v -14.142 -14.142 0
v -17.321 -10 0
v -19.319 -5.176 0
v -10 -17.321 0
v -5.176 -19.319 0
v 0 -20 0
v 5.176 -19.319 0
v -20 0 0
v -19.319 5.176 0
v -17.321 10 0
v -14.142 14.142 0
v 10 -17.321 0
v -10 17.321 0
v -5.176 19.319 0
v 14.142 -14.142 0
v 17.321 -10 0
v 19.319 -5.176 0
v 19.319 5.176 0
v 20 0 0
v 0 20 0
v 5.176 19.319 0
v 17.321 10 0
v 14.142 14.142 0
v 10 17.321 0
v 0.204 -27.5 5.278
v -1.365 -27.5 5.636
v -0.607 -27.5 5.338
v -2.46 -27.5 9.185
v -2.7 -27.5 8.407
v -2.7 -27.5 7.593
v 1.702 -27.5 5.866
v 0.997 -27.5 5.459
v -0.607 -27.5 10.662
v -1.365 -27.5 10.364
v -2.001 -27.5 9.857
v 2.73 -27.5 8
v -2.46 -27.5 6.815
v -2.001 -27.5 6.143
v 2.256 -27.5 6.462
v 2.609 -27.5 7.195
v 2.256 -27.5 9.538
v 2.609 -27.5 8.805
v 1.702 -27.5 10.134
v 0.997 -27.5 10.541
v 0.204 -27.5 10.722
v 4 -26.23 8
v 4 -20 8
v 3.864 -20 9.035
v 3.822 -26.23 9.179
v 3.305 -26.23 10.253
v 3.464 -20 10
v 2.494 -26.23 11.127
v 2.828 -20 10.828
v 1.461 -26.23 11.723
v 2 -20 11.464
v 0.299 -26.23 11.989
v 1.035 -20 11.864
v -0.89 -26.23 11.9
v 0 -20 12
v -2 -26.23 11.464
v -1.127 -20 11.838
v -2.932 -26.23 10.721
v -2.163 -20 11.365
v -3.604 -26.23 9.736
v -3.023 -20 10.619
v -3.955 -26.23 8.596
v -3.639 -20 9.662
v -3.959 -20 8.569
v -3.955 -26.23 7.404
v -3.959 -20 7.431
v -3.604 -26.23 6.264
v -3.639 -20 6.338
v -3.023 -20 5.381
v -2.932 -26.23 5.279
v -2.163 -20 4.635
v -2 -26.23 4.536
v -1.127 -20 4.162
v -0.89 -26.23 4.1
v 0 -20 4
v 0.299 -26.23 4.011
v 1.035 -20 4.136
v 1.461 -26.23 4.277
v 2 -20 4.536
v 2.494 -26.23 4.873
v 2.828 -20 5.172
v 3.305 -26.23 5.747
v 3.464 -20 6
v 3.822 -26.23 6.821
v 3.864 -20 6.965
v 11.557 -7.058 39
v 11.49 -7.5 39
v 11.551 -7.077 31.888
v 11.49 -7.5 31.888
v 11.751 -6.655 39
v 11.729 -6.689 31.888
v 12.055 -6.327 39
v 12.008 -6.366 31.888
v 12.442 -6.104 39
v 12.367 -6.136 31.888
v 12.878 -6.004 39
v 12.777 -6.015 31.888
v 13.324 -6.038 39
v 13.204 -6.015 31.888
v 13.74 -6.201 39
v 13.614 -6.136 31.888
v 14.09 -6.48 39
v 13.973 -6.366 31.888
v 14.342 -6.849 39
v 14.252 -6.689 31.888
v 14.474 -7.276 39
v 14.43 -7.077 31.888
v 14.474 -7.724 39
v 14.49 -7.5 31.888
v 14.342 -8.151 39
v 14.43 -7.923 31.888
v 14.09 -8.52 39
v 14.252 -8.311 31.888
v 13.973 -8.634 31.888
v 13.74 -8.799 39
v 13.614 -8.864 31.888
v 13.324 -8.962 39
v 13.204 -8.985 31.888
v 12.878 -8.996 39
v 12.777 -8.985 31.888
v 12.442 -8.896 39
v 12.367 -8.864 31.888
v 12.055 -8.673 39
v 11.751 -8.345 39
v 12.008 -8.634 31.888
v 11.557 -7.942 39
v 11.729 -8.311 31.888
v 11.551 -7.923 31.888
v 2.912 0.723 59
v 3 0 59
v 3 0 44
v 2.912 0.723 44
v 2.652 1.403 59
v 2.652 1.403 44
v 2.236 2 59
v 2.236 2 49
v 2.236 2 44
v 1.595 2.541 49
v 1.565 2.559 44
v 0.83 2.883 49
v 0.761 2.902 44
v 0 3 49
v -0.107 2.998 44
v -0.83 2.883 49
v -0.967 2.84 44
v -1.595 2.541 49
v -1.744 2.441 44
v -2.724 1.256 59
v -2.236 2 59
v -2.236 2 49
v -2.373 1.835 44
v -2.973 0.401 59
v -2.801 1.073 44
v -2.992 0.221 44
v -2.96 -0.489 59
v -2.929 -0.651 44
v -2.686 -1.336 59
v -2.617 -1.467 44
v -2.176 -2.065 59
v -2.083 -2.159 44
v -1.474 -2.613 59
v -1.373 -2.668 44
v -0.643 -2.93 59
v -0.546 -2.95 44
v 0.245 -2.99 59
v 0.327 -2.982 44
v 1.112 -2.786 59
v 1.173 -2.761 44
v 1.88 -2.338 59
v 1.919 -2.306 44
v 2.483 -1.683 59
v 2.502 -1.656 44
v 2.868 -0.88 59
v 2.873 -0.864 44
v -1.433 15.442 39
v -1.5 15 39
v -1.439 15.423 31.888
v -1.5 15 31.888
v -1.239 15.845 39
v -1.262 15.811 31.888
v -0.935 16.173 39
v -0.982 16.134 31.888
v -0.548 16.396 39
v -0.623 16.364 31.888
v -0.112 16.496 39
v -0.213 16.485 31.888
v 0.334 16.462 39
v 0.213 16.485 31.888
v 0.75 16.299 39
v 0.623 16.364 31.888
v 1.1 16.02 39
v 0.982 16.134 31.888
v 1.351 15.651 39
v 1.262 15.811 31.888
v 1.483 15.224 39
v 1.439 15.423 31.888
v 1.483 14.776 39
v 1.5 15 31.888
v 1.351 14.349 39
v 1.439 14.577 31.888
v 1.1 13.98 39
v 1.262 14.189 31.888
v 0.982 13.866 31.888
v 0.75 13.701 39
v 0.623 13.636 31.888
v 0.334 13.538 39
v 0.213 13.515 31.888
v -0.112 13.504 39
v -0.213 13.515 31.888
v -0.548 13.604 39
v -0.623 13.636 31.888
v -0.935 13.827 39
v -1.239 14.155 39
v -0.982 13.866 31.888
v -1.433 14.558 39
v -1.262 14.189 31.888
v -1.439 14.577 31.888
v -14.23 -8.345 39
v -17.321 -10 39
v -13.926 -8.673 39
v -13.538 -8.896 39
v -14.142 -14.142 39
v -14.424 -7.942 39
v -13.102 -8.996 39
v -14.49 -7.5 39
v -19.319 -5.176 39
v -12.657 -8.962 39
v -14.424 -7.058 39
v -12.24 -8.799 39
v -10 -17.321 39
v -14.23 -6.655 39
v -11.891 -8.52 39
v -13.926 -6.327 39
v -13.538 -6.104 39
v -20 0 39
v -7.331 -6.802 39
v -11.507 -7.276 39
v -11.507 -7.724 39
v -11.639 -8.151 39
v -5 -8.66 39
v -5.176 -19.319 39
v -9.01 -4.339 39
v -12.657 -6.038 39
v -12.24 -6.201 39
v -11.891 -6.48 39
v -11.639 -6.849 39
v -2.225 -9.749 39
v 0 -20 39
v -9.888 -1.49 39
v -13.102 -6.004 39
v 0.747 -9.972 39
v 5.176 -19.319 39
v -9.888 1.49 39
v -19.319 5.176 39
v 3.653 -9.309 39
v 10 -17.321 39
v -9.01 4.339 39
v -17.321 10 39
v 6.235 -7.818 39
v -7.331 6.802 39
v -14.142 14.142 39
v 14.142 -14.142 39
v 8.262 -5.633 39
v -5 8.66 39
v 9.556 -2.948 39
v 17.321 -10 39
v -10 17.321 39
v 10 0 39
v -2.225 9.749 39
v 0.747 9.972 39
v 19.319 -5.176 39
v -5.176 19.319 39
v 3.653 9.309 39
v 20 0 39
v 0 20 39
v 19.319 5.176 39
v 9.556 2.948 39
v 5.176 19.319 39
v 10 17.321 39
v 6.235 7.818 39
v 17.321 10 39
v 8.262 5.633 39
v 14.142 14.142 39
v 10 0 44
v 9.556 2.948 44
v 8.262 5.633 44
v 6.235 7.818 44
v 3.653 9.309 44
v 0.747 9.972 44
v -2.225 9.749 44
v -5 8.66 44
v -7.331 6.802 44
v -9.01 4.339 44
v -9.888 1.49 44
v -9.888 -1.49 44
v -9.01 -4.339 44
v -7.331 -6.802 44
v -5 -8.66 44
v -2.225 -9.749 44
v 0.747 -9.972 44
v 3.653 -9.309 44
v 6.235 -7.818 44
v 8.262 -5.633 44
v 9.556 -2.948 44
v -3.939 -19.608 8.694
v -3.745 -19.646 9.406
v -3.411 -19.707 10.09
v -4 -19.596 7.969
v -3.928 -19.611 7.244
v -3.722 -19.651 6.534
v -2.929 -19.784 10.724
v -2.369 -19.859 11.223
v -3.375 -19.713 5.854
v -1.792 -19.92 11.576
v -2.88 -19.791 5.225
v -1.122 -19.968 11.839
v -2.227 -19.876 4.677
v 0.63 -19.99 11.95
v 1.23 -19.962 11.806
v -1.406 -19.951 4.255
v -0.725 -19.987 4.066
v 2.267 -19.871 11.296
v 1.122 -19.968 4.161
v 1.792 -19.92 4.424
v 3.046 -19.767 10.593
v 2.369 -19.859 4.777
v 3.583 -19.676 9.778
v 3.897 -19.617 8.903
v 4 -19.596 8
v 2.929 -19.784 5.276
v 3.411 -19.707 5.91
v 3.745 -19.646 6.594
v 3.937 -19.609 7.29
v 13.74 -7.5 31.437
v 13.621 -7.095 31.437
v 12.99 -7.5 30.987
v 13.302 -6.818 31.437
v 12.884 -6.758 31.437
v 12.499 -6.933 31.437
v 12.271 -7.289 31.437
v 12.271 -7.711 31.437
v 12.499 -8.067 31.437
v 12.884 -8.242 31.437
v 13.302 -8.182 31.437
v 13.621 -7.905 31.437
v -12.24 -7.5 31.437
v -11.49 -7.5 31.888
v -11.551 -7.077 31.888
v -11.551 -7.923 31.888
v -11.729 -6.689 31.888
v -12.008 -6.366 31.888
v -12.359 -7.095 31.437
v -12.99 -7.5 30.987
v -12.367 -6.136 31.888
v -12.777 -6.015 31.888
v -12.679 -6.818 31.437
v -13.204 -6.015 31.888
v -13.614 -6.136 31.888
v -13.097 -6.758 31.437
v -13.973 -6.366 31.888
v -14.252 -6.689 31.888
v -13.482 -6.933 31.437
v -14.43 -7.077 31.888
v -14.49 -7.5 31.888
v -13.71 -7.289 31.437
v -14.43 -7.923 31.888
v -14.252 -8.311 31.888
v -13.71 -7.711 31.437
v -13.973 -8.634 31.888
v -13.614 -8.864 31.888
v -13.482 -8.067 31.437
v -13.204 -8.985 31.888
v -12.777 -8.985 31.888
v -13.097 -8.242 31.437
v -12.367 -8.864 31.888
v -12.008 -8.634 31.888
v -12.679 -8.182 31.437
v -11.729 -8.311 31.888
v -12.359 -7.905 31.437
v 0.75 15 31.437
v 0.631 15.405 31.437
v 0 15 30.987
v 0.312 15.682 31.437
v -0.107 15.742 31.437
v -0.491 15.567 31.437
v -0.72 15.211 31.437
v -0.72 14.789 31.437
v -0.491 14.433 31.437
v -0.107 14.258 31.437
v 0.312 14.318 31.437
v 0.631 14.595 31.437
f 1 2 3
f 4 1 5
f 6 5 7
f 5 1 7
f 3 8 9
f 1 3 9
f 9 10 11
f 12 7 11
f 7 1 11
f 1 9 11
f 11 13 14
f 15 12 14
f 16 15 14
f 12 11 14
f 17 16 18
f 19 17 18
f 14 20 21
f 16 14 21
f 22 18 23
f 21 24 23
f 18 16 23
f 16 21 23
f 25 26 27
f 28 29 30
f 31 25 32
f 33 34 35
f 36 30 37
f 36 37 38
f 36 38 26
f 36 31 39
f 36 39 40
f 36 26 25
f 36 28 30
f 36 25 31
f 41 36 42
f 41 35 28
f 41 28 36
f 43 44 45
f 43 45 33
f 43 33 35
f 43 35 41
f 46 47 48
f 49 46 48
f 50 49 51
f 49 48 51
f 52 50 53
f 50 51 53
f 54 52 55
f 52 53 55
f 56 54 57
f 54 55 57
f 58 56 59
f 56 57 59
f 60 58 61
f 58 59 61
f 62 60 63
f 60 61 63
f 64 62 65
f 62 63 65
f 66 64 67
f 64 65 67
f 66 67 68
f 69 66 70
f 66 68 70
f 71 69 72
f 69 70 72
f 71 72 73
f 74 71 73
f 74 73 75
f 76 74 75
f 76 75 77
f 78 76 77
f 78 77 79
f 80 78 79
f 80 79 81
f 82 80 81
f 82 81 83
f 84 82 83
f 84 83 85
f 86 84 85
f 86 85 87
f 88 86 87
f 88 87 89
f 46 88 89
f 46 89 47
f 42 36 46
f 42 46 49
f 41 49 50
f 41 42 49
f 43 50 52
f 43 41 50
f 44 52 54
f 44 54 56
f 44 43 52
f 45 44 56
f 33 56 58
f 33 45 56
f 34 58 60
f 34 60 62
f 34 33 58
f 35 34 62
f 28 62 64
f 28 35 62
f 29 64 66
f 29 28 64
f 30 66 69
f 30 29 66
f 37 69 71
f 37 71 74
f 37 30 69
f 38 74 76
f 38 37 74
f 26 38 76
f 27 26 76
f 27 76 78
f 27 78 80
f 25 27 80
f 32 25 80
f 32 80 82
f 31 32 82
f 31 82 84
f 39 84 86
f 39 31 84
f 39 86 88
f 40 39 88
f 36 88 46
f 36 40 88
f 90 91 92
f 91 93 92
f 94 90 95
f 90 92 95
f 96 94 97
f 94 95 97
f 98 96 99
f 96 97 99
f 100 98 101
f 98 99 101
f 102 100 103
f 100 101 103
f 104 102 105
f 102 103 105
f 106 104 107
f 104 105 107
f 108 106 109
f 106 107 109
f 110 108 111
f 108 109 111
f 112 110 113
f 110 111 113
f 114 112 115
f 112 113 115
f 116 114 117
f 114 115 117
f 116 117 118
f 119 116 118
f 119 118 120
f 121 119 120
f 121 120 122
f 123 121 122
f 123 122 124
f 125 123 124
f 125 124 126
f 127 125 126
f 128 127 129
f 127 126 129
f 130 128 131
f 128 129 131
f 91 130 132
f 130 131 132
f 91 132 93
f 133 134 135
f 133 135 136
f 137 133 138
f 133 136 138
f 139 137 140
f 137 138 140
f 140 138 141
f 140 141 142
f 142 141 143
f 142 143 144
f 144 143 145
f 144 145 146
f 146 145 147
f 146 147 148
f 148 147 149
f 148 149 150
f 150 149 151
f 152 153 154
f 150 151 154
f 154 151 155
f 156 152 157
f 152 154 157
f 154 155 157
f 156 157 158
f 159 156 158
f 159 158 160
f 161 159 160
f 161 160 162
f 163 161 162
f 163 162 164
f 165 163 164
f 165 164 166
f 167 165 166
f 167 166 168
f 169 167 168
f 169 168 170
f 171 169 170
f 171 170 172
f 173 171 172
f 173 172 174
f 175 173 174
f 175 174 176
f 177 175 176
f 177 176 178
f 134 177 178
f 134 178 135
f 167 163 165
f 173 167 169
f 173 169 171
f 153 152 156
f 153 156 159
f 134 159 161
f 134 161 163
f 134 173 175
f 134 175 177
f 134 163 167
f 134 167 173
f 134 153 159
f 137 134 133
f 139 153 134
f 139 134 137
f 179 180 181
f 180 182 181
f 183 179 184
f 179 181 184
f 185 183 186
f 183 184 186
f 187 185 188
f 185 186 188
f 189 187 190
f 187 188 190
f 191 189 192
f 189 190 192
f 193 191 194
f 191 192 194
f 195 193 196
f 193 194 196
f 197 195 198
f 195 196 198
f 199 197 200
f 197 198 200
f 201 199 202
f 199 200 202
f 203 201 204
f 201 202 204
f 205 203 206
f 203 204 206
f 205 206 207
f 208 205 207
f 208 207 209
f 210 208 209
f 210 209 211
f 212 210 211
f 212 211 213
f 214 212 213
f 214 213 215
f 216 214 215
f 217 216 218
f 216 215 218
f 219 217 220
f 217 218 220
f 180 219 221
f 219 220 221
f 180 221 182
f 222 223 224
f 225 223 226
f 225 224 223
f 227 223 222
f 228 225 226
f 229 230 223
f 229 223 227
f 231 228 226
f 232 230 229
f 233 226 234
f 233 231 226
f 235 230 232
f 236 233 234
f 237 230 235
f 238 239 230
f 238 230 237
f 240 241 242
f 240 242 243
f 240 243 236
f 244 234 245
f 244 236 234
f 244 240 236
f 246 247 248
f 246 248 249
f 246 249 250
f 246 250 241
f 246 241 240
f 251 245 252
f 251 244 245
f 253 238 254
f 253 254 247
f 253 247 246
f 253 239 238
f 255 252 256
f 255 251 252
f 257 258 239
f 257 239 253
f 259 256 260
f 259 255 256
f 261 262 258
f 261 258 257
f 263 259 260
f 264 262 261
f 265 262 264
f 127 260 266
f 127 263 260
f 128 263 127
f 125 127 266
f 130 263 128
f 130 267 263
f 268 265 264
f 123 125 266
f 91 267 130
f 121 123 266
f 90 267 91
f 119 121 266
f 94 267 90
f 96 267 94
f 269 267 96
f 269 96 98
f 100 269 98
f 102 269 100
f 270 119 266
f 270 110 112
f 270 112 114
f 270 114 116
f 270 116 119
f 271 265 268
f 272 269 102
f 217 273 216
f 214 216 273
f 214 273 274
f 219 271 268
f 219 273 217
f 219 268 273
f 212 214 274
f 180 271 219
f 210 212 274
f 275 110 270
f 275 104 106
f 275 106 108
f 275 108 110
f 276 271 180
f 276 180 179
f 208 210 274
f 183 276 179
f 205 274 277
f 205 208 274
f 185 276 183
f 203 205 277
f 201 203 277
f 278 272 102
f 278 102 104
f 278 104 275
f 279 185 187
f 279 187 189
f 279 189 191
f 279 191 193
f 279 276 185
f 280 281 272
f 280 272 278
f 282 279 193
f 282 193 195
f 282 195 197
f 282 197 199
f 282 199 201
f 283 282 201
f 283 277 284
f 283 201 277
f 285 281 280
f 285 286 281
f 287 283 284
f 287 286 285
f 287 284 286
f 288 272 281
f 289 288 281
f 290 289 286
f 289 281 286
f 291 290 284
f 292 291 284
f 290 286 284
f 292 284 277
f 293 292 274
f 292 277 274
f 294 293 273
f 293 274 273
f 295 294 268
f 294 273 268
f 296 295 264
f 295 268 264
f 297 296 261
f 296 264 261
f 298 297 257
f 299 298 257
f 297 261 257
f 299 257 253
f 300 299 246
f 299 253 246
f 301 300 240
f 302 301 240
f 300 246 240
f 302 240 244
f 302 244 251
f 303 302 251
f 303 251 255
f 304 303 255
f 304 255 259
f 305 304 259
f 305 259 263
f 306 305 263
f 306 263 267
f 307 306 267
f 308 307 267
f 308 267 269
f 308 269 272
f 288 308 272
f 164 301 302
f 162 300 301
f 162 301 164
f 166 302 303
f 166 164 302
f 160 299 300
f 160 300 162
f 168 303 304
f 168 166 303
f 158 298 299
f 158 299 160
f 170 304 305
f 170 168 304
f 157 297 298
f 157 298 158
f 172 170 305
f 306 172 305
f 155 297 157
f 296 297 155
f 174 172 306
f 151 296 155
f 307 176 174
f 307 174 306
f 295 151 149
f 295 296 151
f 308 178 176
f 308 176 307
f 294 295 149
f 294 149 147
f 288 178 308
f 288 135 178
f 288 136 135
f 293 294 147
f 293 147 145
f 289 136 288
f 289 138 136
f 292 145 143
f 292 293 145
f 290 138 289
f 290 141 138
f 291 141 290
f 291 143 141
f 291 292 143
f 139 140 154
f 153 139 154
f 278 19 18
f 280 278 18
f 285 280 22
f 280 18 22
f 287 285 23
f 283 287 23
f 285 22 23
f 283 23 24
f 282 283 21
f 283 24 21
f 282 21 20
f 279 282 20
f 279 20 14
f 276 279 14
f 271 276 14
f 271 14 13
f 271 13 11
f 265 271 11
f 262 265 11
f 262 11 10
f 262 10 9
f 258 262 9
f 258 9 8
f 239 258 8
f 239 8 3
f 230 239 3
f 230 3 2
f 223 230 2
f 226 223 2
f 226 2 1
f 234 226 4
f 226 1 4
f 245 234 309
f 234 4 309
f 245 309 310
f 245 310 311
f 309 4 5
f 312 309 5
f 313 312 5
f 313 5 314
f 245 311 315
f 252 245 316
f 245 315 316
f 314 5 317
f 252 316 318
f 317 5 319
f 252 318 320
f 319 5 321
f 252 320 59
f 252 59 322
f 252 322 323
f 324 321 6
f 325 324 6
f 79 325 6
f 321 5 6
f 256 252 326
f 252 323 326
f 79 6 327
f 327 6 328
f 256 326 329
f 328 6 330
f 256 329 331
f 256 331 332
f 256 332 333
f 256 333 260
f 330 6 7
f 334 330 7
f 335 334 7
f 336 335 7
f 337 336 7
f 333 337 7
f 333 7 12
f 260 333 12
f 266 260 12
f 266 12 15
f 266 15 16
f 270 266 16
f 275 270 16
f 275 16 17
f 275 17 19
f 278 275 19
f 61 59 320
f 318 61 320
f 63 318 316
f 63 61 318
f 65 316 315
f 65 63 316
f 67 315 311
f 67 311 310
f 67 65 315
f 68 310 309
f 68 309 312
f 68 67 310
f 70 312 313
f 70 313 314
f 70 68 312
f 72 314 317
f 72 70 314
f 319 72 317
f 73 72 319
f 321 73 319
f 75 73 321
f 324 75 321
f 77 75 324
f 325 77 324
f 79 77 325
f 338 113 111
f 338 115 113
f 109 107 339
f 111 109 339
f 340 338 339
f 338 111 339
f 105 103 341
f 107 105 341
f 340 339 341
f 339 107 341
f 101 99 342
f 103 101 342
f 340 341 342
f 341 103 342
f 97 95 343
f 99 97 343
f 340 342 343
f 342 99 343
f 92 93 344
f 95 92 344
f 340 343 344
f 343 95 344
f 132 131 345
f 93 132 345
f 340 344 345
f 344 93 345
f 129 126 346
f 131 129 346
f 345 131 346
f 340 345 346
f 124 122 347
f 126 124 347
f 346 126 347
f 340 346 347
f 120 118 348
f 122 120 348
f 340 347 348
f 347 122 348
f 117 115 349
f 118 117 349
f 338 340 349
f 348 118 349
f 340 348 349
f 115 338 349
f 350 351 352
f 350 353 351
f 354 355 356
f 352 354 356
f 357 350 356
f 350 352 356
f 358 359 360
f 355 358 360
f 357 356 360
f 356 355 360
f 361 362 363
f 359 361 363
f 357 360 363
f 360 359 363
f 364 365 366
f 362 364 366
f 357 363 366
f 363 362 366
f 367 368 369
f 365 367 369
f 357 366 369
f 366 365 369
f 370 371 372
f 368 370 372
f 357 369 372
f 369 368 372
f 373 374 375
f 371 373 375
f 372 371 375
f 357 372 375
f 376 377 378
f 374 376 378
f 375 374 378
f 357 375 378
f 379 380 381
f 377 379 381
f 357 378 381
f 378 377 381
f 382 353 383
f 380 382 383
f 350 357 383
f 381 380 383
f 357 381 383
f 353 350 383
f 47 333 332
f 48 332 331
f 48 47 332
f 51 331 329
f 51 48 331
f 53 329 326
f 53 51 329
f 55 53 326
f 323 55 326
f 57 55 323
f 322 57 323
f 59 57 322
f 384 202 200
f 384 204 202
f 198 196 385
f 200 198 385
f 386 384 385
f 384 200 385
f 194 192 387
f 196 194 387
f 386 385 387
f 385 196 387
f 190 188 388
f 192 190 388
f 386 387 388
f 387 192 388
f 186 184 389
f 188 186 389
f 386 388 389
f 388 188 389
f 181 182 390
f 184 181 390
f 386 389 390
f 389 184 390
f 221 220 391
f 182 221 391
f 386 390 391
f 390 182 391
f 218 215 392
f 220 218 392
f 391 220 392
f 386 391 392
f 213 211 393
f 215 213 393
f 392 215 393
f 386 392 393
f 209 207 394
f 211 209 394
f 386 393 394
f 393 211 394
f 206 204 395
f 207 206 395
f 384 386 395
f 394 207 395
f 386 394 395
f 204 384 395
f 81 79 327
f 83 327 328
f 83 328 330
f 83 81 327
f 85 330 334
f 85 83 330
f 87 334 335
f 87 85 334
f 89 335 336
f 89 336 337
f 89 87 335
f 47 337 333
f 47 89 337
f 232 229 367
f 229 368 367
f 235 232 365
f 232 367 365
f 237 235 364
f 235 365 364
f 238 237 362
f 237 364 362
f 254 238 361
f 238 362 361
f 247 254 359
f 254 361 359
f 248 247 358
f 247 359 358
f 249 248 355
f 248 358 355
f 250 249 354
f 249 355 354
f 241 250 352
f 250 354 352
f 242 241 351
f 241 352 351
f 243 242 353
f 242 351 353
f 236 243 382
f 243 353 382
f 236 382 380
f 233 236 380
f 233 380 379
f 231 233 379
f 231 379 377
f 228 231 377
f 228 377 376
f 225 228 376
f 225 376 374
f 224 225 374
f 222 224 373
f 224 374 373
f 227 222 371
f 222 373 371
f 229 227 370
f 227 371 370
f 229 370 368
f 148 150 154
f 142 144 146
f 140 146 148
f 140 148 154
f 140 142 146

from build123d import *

# Parameters (mm, degrees)
F0_R          = 20
F0_R_2        = 10
F1_DEPTH      = 39
F2_DEPTH      = 44
F3_DEPTH      = 59
F4_DEPTH      = 49
F6_R          = 4
F7_DEPTH      = 7.5
F7_DEPTH_BACK = 25.4
F8_SIZE       = 1.27
F10_D         = 3
F10_DEPTH     = 7.112
F10_TIP       = 0.9012909285


with BuildPart() as f1:
    # F0 (on Top) → F1 (new body)
    with BuildSketch(Plane.XY):
        Circle(F0_R)
        Circle(F0_R_2, mode=Mode.SUBTRACT)
    extrude(amount=F1_DEPTH)

    # F0 (on Top) → F2 (join)
    with BuildSketch(Plane.XY):
        Circle(F0_R_2)
        with BuildLine():
            ThreePointArc((2.2360679775, 2), (2.8025170769, 1.0704662693), (3, 0))
            ThreePointArc((3, 0), (-1.0704662693, -2.8025170769), (-2.2360679775, 2))
            ThreePointArc((-2.2360679775, 2), (0, 3), (2.2360679775, 2))
        make_face(mode=Mode.SUBTRACT)
    extrude(amount=F2_DEPTH)

    # F0 (on Top) → F3 (join)
    with BuildSketch(Plane.XY):
        with BuildLine():
            ThreePointArc((-2.2360679775, 2), (-1.0704662693, -2.8025170769), (3, 0))
            ThreePointArc((3, 0), (2.8025170769, 1.0704662693), (2.2360679775, 2))
            Line((2.2360679775, 2), (-2.2360679775, 2))
        make_face()
    extrude(amount=F3_DEPTH)

    # F0 (on Top) → F4 (join)
    with BuildSketch(Plane.XY):
        with BuildLine():
            Line((-2.2360679775, 2), (2.2360679775, 2))
            ThreePointArc((2.2360679775, 2), (0, 3), (-2.2360679775, 2))
        make_face()
    extrude(amount=F4_DEPTH)

    # F6 (on offset) → F7 (join, two sides)
    with BuildSketch(Plane.XZ.offset(20)) as f7_sk:
        with Locations((0, 8)):
            Circle(F6_R)
    extrude(amount=F7_DEPTH)
    extrude(f7_sk.sketch, amount=-F7_DEPTH_BACK)

    # F8
    f8_edges = [f1.edges().sort_by_distance(p)[0] for p in [
        (-4, -27.5, 8),
    ]]
    chamfer(f8_edges, length=F8_SIZE)

    # F10
    with Locations(Plane.XY.offset(39)):
        with Locations((0, 15), (-12.9903810568, -7.5), (12.9903810568, -7.5)):
            Hole(F10_D / 2, depth=F10_DEPTH)
            with Locations((0, 0, -(F10_DEPTH + F10_TIP / 2))):  # 118° drill point
                Cone(0, F10_D / 2, F10_TIP, mode=Mode.SUBTRACT)


solid = f1.part
